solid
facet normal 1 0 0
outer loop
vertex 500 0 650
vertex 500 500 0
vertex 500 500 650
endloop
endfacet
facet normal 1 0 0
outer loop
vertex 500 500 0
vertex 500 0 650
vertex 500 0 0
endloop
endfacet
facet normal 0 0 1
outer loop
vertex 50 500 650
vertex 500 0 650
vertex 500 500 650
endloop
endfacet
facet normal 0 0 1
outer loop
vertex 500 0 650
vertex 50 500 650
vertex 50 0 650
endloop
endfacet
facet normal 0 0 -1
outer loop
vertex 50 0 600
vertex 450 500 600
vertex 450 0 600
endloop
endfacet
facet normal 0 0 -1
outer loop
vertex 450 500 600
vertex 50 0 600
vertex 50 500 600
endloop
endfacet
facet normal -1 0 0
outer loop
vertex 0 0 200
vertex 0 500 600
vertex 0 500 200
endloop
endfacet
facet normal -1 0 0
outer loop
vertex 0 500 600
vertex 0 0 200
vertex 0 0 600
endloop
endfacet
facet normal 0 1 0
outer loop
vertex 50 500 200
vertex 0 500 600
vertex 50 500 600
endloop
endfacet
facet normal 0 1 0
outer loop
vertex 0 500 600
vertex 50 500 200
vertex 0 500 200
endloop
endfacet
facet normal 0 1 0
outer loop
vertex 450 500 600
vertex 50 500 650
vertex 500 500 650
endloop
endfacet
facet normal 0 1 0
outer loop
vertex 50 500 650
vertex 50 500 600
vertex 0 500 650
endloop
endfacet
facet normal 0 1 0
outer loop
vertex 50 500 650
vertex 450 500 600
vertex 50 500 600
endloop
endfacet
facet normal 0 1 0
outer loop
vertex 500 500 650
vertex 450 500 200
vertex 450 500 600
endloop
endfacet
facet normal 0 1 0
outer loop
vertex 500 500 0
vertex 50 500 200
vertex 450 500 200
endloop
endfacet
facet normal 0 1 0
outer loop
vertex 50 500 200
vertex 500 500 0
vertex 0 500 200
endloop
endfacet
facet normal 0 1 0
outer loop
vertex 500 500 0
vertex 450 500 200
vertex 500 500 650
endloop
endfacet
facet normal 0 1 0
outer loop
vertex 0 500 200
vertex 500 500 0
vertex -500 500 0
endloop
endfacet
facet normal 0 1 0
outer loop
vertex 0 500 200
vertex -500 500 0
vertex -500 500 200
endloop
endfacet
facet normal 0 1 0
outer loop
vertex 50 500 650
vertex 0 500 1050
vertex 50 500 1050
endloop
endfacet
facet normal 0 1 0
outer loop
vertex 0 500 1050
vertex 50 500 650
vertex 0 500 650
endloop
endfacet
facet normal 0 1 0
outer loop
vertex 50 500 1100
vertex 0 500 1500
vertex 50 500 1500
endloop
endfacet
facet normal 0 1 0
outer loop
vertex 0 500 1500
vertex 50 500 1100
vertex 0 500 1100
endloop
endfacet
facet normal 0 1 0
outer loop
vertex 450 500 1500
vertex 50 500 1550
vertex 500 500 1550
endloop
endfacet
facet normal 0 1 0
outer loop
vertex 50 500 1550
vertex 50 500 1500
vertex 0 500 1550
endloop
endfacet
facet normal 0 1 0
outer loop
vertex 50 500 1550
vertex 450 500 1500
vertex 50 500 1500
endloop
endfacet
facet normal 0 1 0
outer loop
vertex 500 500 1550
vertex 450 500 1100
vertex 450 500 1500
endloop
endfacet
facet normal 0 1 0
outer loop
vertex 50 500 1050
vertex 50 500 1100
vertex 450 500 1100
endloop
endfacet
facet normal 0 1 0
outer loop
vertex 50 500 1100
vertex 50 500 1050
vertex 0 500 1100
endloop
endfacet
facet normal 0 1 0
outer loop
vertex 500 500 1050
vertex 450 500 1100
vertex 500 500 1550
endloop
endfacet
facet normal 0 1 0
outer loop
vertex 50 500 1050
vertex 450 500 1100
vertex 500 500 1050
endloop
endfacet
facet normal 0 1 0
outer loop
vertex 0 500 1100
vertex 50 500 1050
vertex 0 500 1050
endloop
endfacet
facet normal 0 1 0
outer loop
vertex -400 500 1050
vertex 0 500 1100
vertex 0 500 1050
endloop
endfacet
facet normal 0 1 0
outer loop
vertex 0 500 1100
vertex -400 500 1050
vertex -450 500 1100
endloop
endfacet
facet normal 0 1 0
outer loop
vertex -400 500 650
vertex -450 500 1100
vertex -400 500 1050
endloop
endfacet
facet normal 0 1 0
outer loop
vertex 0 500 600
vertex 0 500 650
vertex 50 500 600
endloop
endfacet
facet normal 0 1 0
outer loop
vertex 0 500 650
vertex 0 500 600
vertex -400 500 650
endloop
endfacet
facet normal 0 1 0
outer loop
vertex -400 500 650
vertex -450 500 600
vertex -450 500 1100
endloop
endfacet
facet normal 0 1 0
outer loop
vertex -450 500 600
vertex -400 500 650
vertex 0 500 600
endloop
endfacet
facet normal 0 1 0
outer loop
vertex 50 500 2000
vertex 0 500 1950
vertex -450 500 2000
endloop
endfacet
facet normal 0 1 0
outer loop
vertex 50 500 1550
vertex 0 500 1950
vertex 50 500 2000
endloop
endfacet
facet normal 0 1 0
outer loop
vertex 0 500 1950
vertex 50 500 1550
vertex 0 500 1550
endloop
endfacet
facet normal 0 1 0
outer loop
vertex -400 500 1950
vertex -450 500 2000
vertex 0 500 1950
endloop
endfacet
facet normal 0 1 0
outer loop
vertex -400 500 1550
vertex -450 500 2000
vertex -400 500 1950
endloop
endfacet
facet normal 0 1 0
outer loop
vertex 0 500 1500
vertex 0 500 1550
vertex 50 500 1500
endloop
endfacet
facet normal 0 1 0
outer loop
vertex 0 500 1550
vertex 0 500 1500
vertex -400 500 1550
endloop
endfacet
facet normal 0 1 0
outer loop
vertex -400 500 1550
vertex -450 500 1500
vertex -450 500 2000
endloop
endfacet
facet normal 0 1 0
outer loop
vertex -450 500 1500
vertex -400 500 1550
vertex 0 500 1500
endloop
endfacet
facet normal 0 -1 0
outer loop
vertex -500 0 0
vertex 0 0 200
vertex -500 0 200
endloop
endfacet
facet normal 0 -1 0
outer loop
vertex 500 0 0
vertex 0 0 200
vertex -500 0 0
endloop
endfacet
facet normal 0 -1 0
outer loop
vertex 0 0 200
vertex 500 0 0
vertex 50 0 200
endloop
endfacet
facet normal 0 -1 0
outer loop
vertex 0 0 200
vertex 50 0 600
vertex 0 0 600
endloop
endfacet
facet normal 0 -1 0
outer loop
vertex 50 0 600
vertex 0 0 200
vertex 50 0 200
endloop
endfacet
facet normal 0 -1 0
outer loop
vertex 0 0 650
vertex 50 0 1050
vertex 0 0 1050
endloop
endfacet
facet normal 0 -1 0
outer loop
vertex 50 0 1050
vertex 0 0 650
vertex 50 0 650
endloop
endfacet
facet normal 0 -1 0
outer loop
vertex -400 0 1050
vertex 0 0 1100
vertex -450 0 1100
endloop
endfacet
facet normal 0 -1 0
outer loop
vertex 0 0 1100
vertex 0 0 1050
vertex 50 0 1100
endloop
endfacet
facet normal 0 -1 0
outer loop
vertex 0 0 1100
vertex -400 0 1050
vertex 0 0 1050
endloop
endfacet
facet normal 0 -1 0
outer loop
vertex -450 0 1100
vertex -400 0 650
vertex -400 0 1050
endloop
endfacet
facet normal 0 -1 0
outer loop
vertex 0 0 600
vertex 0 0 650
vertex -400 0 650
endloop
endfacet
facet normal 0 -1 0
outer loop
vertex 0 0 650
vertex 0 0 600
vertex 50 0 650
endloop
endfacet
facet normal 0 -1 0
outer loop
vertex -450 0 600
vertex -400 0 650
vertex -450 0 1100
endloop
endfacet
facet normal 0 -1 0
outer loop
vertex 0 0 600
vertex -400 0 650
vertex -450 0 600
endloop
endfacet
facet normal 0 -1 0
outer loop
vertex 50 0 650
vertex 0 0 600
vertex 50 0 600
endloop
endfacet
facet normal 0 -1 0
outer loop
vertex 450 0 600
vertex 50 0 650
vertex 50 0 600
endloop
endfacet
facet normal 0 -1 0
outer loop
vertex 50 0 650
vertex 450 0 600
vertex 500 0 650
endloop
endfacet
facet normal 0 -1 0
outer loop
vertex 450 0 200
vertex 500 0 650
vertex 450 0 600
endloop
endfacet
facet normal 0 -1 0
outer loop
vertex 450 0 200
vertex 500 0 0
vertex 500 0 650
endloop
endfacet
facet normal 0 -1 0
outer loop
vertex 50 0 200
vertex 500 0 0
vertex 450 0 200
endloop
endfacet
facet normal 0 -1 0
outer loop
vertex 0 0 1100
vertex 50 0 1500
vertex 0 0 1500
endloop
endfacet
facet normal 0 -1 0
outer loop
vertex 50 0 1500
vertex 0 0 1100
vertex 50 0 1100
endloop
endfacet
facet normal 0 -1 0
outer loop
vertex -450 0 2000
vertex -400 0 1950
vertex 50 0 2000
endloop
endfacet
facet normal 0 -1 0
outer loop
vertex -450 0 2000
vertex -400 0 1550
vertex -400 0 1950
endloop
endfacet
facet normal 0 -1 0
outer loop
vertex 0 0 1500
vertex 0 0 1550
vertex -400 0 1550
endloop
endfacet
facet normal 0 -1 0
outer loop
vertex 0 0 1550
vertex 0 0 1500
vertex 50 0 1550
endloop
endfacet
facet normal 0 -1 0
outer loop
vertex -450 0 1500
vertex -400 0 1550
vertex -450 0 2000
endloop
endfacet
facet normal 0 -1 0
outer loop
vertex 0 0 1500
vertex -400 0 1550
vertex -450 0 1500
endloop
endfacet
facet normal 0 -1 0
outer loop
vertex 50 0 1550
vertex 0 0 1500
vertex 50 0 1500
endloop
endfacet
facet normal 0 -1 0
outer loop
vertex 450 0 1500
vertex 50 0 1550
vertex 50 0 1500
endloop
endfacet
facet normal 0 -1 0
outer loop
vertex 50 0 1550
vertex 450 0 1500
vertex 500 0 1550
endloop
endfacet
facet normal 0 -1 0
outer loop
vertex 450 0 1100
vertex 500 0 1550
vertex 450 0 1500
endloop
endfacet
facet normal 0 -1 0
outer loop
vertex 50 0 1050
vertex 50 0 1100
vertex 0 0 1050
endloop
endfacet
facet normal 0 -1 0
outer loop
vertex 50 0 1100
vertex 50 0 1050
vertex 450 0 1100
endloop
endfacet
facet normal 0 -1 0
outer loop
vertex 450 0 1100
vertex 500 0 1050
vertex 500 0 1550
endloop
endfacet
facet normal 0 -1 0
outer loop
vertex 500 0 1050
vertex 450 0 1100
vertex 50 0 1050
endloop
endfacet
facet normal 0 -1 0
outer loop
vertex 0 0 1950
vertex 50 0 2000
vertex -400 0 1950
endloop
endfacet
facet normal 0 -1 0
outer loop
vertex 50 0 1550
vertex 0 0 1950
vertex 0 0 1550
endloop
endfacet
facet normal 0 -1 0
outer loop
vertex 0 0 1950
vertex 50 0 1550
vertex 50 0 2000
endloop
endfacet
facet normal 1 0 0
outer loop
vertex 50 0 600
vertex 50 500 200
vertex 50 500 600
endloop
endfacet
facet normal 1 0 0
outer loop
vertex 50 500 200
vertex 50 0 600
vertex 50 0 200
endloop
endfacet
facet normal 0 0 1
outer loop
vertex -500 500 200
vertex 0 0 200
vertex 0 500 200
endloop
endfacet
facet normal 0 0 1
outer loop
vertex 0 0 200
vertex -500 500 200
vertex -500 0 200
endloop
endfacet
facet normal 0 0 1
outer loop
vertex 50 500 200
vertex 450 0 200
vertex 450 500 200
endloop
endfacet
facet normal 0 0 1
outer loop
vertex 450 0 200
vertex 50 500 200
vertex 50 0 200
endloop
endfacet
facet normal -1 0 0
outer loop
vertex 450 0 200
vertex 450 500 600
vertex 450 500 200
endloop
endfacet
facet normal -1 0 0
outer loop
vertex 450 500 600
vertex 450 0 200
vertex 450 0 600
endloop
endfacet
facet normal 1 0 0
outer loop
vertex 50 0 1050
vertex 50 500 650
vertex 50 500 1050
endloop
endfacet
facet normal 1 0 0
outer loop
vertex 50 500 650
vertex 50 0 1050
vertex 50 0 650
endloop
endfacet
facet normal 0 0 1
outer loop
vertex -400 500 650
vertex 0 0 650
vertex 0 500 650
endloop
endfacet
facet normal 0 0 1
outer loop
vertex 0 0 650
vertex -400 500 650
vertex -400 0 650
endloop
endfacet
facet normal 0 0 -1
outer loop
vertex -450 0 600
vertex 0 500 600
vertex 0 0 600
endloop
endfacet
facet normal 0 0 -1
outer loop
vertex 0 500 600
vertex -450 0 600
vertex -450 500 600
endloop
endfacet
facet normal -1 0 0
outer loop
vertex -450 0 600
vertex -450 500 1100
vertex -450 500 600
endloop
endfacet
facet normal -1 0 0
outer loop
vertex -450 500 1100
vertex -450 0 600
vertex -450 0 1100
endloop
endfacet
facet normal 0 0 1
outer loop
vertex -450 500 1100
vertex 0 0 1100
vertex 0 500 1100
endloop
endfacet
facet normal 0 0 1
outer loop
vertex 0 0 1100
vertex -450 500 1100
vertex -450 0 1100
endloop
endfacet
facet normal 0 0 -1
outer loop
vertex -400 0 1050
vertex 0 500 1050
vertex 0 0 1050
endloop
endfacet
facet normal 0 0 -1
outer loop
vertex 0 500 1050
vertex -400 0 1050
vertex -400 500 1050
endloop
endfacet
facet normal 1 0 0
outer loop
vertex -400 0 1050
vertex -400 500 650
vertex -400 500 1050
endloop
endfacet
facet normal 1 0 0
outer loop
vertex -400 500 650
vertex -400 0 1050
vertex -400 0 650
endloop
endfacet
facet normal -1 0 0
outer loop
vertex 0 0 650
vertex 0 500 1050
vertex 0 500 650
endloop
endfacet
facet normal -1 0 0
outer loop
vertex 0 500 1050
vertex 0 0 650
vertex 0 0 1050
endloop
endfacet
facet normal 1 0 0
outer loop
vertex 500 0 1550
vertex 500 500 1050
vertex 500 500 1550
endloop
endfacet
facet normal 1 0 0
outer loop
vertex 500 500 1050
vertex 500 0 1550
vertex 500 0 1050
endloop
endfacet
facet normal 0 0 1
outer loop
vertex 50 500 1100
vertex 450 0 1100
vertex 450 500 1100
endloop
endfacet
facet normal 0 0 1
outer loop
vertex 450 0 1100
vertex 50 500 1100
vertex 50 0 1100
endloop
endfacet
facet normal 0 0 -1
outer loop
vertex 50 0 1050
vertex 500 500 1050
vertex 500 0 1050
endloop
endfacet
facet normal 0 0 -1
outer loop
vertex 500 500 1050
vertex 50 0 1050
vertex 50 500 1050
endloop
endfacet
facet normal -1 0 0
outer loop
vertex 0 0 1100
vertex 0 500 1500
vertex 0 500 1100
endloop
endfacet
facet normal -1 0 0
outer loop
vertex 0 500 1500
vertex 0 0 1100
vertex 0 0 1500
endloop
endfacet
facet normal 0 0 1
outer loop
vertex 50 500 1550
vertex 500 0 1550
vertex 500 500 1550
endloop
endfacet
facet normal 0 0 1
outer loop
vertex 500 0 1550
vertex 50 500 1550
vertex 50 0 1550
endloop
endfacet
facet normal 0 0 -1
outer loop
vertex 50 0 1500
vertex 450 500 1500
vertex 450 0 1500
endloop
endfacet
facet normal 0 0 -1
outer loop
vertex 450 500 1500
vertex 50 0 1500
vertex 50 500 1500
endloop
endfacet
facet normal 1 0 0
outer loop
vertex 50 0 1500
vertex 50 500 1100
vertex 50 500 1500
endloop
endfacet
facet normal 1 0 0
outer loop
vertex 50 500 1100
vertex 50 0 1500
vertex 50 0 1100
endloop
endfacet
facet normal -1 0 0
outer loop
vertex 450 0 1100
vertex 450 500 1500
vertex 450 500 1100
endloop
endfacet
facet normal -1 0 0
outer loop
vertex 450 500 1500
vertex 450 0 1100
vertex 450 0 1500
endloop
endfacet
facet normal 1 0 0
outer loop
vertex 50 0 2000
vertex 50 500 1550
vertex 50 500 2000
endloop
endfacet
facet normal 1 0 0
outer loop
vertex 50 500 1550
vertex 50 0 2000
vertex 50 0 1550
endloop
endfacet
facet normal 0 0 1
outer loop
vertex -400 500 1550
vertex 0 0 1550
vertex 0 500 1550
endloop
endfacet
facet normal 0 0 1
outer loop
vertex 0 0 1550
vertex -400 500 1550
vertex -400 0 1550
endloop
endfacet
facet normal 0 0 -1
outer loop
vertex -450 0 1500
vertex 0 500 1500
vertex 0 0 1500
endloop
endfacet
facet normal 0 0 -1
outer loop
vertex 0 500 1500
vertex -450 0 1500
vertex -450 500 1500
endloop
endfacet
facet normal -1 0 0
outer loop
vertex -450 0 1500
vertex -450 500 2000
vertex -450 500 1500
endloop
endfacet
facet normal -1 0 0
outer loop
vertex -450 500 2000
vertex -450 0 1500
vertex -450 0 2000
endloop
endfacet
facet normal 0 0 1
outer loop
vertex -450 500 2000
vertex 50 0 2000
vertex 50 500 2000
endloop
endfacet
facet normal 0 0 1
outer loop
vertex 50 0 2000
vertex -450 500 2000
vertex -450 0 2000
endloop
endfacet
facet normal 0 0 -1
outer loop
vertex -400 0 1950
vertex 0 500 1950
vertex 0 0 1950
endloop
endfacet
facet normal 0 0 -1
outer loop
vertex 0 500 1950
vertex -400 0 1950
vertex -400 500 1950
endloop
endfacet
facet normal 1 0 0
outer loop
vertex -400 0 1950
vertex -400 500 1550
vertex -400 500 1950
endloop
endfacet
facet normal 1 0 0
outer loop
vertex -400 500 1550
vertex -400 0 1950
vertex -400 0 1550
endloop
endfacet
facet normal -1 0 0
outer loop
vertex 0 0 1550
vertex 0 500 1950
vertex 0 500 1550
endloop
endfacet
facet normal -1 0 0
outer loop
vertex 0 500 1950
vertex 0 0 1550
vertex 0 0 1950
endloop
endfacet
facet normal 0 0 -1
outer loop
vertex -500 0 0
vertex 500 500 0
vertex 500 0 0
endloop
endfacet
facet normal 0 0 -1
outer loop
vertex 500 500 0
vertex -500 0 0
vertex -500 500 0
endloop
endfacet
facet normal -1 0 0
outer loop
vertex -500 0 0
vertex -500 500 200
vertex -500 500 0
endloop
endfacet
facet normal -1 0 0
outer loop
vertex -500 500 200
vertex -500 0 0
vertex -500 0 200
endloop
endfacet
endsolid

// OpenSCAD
square = 4;

width = 500;

border = 50;

baseHeight = 200;

module construct(square, width, border, baseHeight) { 
    position1 = 0;
    position2 = -width + border;
    
    translate([-width, 0, 0])
        cube([width * 2, width, baseHeight]);
    translate([0, 0, baseHeight - border])
        for (i=[0 : square - 1]){
            translate([(i % 2 == 0 ? position1 : position2), 0, (width - border)*i])
            union(){   
                if (i != 0) {
                    //-- Parte inferior
                    cube([width, width, border]);
                }
                //-- Parte superior
                translate([0, 0, width - border ])
                    cube([width, width, border]);;
                //-- Parte izquierda
                translate([0 , 0, border])
                    cube([border, width, width - border * 2]);
                //-- Parte derecha
                translate([width - border, 0, border])
                    cube([border, width, width - border * 2]);
            }
        }
}

construct(square, width, border, baseHeight);
